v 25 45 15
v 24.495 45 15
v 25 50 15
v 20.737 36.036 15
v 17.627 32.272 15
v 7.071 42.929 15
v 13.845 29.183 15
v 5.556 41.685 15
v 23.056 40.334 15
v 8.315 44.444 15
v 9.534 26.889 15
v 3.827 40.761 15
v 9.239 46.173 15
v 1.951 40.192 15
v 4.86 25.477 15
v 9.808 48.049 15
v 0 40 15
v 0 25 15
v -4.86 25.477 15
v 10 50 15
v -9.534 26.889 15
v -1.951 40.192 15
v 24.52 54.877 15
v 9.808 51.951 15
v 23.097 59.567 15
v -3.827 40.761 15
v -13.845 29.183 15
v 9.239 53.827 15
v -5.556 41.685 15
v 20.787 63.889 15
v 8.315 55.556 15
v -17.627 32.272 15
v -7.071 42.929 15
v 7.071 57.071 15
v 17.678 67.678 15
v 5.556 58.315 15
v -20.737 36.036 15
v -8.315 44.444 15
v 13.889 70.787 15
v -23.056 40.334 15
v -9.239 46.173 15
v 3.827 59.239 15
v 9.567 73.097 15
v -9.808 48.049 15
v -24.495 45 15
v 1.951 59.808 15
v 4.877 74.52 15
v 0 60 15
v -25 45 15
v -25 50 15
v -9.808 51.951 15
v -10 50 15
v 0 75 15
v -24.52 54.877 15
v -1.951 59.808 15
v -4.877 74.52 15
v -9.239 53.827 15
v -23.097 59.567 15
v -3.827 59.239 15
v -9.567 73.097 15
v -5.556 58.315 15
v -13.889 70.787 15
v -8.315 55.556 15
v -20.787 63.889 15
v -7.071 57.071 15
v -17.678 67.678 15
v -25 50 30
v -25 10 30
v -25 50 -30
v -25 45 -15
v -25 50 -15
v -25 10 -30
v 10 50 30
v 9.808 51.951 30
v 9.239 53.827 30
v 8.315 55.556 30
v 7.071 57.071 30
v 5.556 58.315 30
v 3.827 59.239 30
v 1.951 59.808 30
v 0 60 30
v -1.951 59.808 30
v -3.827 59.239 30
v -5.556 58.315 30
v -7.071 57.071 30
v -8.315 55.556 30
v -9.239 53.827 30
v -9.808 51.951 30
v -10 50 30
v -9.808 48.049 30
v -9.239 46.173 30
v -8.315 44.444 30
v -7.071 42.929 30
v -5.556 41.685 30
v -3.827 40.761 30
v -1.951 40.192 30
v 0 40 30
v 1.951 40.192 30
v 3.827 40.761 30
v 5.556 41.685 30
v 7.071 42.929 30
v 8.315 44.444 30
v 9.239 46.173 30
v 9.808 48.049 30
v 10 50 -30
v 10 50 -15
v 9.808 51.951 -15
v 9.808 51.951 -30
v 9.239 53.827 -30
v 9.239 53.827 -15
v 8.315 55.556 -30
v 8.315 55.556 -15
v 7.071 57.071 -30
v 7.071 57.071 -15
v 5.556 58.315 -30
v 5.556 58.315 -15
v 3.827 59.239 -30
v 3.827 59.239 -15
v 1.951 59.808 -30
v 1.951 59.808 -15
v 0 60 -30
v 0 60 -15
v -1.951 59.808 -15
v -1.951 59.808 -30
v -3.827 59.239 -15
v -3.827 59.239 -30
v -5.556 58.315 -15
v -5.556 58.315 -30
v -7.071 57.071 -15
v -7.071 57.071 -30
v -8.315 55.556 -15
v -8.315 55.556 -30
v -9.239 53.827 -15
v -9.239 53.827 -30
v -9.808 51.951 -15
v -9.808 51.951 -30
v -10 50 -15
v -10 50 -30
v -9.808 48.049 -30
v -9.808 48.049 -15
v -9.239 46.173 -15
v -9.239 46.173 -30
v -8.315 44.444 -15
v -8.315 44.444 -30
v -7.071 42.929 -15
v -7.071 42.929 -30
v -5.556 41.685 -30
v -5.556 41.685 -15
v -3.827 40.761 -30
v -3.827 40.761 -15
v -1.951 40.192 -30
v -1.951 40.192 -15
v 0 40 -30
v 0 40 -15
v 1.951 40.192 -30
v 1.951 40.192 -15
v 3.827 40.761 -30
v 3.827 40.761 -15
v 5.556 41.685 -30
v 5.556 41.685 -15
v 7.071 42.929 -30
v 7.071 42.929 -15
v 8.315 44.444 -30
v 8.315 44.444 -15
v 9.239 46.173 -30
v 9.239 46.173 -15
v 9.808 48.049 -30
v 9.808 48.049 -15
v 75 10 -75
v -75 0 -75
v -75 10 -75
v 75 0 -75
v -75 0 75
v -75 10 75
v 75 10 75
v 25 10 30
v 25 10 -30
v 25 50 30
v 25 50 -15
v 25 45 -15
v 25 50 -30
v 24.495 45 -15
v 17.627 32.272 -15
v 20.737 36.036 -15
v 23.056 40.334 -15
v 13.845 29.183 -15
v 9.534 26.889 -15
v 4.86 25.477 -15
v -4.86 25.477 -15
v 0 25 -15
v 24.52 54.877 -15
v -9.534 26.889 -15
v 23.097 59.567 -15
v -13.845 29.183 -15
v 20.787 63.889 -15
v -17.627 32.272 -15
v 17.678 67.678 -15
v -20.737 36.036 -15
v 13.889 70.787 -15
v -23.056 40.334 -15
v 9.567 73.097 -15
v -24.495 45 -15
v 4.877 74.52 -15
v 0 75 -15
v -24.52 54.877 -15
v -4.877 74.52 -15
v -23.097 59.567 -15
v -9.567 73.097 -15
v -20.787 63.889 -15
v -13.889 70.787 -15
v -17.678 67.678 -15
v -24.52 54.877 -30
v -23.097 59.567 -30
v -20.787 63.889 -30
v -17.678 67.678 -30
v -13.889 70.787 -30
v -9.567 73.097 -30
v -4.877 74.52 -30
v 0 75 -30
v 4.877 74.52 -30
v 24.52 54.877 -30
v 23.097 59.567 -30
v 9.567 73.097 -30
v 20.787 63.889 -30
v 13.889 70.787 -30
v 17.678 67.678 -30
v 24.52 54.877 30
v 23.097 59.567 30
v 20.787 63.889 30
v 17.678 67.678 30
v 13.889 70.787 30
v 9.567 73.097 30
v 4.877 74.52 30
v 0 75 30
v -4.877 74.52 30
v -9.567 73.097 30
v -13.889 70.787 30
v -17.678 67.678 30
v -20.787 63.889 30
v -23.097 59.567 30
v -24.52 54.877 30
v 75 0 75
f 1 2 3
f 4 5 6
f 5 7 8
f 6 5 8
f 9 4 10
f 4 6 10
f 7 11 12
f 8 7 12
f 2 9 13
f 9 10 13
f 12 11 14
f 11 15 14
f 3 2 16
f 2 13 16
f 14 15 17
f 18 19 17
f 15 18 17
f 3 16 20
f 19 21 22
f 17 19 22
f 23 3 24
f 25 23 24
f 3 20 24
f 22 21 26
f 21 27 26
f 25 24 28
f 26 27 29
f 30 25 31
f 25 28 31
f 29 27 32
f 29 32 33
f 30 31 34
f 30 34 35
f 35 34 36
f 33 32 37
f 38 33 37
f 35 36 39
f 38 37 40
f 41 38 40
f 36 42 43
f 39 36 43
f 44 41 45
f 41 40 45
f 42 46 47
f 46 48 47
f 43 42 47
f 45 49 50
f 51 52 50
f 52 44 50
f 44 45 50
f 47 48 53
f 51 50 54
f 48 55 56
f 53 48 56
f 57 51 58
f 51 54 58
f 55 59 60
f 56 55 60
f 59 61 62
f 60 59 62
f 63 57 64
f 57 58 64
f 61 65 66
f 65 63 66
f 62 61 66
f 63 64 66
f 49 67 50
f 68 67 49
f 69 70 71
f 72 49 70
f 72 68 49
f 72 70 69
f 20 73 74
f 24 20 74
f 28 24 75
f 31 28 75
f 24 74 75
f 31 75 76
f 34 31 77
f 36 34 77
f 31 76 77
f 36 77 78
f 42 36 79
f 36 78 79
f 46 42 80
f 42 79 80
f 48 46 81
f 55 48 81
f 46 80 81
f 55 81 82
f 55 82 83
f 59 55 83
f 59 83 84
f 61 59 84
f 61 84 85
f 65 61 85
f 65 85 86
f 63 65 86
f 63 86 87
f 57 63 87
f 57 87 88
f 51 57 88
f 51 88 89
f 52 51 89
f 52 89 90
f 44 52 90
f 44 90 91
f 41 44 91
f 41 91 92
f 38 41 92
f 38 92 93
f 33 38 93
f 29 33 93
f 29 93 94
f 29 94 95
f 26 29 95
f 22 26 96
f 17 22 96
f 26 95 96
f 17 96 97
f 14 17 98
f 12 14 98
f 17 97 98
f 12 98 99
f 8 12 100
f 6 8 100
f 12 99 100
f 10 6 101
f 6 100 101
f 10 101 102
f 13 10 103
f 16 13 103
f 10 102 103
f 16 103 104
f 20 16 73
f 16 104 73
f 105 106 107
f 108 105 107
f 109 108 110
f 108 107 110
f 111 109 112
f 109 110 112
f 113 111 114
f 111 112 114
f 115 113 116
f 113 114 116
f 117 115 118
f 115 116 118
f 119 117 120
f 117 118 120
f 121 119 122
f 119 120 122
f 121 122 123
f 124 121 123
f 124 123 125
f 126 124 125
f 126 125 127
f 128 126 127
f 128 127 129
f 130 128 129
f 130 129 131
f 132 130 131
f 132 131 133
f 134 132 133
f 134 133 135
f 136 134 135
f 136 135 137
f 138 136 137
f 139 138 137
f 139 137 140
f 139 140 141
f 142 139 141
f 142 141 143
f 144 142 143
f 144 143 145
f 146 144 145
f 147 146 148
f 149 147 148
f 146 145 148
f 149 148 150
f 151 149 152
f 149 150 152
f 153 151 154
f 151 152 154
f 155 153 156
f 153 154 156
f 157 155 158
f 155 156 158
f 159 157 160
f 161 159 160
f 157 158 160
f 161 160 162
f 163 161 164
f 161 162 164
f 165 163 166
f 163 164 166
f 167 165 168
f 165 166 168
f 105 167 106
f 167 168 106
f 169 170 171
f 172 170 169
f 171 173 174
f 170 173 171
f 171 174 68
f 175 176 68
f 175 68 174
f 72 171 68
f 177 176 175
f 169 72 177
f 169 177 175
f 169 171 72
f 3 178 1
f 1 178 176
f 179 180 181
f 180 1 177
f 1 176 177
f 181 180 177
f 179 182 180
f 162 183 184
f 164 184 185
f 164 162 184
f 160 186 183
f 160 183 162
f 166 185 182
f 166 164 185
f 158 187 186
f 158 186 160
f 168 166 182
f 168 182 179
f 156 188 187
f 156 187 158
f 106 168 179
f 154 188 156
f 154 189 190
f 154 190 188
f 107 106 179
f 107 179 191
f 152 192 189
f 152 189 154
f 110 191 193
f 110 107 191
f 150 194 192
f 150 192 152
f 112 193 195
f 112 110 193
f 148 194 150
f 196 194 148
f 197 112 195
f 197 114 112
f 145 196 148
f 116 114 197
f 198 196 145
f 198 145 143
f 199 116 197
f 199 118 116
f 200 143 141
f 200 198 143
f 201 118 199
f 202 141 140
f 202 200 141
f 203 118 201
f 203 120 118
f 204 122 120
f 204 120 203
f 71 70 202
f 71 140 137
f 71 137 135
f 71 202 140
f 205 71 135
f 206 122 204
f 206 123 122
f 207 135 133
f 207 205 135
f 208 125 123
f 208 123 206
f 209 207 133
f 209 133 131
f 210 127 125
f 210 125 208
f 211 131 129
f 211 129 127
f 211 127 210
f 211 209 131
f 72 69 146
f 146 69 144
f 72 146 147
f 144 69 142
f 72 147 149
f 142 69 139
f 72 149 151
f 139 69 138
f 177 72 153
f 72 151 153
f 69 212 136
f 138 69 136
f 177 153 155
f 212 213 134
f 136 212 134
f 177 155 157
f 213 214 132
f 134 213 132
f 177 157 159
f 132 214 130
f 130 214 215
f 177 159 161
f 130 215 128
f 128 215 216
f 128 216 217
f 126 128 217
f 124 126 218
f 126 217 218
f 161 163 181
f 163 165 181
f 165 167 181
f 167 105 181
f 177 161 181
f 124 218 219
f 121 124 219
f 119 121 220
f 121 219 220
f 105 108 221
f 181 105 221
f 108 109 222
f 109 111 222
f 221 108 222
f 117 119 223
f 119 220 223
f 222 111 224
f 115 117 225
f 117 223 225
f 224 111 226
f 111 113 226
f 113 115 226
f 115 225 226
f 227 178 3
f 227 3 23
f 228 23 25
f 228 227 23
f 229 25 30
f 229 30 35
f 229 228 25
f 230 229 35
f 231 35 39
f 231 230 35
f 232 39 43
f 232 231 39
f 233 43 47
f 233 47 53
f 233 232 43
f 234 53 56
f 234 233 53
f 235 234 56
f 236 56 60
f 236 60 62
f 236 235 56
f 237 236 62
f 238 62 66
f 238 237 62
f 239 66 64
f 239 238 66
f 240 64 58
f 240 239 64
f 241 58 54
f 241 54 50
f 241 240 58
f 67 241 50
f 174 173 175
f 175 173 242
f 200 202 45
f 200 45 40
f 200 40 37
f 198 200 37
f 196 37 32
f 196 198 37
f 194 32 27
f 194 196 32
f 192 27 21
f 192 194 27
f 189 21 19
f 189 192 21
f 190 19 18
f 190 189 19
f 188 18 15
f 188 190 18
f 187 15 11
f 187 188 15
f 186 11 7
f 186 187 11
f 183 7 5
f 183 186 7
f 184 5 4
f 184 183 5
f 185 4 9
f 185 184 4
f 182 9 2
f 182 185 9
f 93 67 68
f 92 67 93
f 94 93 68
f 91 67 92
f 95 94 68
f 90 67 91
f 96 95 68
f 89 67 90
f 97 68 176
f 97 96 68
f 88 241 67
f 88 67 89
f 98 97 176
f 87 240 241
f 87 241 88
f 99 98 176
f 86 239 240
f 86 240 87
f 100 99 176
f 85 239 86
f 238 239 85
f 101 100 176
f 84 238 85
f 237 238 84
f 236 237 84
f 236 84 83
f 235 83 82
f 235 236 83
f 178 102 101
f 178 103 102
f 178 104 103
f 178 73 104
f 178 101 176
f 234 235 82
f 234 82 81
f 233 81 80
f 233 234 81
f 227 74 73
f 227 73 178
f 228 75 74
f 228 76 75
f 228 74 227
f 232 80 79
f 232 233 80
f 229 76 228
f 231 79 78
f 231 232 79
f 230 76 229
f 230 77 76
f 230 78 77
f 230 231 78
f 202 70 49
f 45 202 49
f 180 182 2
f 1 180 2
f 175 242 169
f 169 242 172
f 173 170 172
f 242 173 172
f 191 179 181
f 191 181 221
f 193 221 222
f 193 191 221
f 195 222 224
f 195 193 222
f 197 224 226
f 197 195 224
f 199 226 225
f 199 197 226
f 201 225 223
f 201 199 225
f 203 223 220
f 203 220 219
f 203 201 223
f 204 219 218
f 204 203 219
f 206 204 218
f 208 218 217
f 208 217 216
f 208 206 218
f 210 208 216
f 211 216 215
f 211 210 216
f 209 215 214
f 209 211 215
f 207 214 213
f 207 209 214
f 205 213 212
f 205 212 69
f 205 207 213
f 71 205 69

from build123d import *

# Parameters (mm, degrees)
SKETCH1_W           = 150
SKETCH1_H           = 150
BOSS_EXTRUDE1_DEPTH = 10
SKETCH2_W           = 50
SKETCH2_H           = 60
BOSS_EXTRUDE2_DEPTH = 40
BOSS_EXTRUDE3_DEPTH = 60
SKETCH4_R           = 10
CUT_EXTRUDE1_DEPTH  = 60
SKETCH5_W           = 30
SKETCH5_H           = 30
CUT_EXTRUDE2_DEPTH  = 50
SKETCH6_R           = 25
CUT_EXTRUDE3_DEPTH  = 30


with BuildPart() as part:
    # Sketch1 → Boss-Extrude1 (new body)
    with BuildSketch(Plane(origin=(0, 0, 0), x_dir=(1, 0, 0), z_dir=(0, 1, 0))):
        Rectangle(SKETCH1_W, SKETCH1_H)
    extrude(amount=BOSS_EXTRUDE1_DEPTH)

    # Sketch2 → Boss-Extrude2 (add)
    with BuildSketch(Plane(origin=(0, 10, 0), x_dir=(1, 0, 0), z_dir=(0, 1, 0))):
        Rectangle(SKETCH2_W, SKETCH2_H)
    extrude(amount=BOSS_EXTRUDE2_DEPTH)

    # Sketch3 → Boss-Extrude3 (add)
    with BuildSketch(Plane.XY.offset(30)):
        with BuildLine():
            Line((-25, 50), (25, 50))
            ThreePointArc((25, 50), (0, 75), (-25, 50))
        make_face()
    extrude(amount=-BOSS_EXTRUDE3_DEPTH)

    # Sketch4 → Cut-Extrude1 (cut)
    with BuildSketch(Plane.XY.offset(30)):
        with Locations((0, 50)):
            Circle(SKETCH4_R)
    extrude(amount=-CUT_EXTRUDE1_DEPTH, mode=Mode.SUBTRACT)

    # Sketch5 → Cut-Extrude2 (cut)
    with BuildSketch(Plane.ZY.offset(25)):
        with Locations((0, 60)):
            Rectangle(SKETCH5_W, SKETCH5_H)
    extrude(amount=-CUT_EXTRUDE2_DEPTH, mode=Mode.SUBTRACT)

    # Sketch6 → Cut-Extrude3 (cut)
    with BuildSketch(Plane.XY.offset(-15)):
        with Locations((0, 50)):
            Circle(SKETCH6_R)
    extrude(amount=CUT_EXTRUDE3_DEPTH, mode=Mode.SUBTRACT)


solid = part.part
